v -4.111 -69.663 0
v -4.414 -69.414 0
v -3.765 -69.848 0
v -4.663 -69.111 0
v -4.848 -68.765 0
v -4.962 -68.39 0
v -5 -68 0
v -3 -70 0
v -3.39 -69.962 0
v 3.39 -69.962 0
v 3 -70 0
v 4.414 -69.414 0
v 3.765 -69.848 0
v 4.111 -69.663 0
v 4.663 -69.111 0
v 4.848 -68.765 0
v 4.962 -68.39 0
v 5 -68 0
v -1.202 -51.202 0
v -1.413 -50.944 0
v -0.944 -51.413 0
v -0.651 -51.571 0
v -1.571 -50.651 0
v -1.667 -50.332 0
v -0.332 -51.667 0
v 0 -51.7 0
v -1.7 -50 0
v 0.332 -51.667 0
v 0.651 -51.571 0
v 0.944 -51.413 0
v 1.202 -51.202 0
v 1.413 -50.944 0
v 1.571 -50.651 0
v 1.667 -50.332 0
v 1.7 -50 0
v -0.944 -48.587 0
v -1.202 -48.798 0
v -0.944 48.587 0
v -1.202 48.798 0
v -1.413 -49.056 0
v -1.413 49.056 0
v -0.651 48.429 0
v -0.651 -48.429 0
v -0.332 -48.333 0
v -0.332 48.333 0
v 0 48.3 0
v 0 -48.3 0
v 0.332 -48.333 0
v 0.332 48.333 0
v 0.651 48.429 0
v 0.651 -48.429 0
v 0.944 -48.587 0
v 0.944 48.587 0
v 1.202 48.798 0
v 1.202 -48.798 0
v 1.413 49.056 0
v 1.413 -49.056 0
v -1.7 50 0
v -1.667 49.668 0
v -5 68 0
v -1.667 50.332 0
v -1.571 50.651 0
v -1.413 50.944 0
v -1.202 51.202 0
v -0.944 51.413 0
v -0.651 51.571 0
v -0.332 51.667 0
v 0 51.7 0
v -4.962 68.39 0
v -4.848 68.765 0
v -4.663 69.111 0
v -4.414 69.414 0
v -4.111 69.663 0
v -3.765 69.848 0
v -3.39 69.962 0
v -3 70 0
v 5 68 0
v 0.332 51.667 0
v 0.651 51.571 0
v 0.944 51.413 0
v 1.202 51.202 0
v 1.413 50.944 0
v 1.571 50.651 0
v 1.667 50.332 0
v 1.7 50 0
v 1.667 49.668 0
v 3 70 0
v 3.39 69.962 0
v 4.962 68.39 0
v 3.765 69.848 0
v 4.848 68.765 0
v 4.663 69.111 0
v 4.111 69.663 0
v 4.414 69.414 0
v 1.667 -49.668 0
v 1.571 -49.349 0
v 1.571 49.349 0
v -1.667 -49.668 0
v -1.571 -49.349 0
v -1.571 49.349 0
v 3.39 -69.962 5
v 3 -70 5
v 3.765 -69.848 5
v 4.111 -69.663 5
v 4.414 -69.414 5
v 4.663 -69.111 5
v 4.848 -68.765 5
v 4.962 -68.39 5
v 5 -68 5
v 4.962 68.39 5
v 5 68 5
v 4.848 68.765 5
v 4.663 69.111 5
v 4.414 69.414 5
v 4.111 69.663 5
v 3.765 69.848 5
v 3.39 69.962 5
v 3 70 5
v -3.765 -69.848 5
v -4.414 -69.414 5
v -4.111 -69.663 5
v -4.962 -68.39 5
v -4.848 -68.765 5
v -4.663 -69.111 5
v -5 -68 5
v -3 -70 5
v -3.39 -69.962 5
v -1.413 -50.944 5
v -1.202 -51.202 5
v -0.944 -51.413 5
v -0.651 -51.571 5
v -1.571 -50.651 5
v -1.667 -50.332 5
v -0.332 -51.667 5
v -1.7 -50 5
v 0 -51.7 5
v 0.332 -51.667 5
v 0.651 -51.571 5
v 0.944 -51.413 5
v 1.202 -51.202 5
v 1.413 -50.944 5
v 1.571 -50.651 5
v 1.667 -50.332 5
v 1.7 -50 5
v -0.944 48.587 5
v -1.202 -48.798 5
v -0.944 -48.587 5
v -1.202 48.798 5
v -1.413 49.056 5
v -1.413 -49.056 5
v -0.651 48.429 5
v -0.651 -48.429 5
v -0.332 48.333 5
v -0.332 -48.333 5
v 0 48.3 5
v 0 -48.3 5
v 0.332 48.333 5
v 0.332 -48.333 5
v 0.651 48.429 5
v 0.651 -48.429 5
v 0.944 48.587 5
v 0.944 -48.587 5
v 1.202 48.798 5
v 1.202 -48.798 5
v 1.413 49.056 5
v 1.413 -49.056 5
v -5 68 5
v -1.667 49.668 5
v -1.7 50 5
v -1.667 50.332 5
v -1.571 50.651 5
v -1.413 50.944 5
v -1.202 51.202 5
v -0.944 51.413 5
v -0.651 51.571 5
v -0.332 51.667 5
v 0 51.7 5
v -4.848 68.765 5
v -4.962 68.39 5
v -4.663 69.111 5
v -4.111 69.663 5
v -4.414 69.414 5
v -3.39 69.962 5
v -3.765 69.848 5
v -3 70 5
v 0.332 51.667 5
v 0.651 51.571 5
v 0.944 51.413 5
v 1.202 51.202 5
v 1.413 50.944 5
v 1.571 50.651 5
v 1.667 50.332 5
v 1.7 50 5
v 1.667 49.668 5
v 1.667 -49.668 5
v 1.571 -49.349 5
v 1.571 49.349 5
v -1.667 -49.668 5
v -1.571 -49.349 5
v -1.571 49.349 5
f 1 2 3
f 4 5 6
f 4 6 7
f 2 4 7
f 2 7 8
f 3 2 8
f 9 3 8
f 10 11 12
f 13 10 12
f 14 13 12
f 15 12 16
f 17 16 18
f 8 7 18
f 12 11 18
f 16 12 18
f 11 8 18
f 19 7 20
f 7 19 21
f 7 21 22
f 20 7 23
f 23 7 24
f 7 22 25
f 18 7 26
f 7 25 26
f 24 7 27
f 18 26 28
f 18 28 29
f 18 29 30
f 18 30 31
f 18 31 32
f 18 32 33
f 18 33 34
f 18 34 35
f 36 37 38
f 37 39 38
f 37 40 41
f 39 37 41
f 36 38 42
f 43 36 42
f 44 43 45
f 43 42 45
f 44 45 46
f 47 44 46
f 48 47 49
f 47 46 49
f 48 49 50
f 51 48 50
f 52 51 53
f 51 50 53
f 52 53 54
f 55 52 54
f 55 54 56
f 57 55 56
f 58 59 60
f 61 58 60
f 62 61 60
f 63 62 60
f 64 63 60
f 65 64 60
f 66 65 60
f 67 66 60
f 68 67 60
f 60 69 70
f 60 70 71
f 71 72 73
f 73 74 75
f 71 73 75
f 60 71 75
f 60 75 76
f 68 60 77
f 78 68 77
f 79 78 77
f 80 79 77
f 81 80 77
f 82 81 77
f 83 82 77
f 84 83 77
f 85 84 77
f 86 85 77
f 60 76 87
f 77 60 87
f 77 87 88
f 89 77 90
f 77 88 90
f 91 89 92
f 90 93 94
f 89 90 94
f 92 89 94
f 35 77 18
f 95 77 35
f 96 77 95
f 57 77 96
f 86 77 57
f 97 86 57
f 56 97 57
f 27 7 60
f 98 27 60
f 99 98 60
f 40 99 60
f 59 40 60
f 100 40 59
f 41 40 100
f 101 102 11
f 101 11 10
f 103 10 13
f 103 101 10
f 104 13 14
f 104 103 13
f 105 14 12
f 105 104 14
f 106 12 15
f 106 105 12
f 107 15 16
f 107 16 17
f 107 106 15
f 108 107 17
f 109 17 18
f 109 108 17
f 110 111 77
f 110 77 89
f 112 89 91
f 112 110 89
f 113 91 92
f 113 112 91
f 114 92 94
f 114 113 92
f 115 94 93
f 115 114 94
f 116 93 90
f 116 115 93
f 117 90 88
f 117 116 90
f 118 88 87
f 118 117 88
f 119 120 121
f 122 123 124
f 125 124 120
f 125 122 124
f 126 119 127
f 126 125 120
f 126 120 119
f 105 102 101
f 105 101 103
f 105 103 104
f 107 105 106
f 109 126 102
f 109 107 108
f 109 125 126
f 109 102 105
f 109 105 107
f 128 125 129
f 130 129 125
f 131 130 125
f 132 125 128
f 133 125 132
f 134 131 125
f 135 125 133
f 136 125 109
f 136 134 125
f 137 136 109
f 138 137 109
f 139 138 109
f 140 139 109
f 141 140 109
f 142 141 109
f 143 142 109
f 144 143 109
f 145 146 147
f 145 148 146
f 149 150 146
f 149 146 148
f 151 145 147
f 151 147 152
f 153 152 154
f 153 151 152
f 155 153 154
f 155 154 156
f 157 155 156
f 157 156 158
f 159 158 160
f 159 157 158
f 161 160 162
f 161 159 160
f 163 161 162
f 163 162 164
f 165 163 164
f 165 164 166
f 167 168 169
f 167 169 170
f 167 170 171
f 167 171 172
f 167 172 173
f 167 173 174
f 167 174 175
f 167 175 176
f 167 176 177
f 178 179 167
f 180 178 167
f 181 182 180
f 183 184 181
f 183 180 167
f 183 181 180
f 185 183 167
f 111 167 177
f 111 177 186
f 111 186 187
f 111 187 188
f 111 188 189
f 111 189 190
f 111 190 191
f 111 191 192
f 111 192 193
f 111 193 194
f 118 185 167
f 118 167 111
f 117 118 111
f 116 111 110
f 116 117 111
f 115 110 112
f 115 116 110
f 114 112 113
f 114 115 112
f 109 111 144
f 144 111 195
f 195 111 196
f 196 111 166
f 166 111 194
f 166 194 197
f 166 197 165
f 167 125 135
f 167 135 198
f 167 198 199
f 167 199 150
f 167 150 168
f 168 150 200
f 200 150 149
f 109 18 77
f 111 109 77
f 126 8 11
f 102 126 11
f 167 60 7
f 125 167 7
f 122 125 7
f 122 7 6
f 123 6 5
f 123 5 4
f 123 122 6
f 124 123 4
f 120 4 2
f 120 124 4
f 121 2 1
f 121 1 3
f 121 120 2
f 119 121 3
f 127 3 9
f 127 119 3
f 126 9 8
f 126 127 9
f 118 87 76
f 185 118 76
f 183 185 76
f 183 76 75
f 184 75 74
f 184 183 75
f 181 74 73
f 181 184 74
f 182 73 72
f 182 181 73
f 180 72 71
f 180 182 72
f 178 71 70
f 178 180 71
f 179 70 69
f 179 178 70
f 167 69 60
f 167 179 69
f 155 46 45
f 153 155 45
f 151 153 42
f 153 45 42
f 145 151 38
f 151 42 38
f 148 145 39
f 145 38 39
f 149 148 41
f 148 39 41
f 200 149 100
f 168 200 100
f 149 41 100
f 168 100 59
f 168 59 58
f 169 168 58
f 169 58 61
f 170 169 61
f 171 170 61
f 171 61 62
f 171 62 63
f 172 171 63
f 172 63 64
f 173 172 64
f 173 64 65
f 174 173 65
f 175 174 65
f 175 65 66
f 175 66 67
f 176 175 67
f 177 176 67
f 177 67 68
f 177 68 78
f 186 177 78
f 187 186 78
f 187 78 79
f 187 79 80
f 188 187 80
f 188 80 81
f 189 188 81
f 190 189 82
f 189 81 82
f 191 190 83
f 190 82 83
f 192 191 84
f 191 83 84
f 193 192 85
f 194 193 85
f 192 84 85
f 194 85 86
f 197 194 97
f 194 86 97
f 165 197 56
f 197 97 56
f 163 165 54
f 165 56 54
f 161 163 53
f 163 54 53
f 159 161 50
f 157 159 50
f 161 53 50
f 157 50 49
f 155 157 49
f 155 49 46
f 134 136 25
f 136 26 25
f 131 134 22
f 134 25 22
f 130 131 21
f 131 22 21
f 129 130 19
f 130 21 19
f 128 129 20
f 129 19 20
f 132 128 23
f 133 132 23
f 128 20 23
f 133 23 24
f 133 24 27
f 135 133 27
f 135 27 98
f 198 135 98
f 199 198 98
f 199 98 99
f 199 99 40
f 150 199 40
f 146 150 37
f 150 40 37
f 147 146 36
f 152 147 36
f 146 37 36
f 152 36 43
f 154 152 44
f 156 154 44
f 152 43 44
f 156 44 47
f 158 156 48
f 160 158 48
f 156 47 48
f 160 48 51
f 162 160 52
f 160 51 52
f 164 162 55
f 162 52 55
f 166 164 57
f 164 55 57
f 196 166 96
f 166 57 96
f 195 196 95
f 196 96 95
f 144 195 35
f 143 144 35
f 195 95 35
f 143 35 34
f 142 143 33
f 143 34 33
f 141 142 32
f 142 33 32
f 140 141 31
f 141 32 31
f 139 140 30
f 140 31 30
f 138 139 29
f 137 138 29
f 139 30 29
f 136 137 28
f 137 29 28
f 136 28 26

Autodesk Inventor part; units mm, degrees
ref_plane "YZ Plane" through (0, 0, 0) normal (1, 0, 0) x (0, 1, 0)
ref_plane "XZ Plane" through (0, 0, 0) normal (0, 1, 0) x (-1, 0, 0)
ref_plane "XY Plane" through (0, 0, 0) normal (0, 0, 1) x (1, 0, 0)
sketch "Sketch1" plane through (0, 0, 0) normal (0, 0, 1) x (1, 0, 0)
  line L0 (-5, -70) -> (5, -70)
  line L1 (5, -70) -> (5, 70)
  line L2 (5, 70) -> (-5, 70)
  line L3 (-5, 70) -> (-5, -70)
  line L4 (-5, -70) -> (5, 70) construction
  line L5 (5, -70) -> (-5, 70) construction
  point P0 (0, 0)
  dimension "d0" = 10
  dimension "d1" = 140
extrude "Extrusion1" add sketch "Sketch1" along normal blind 5
sketch "Sketch2" plane through (0, 0, 5) normal (0, 0, 1) x (1, 0, 0)
  line L0 (0, 50) -> (0, -50) construction
  point P0 (0, 0)
  point P1 (0, 0)
  dimension "d4" = 100
hole "Hole1" at (0, 50, 5) at (0, -50, 5) direction (0, 0, -1) diameter 3.4 depth 8 tip angle 118 clearance for "Countersunk Flat Head Screw DIN EN ISO 2009" size "M3" standard "DIN"
fillet "Fillet1" radius 2 4 edges at (5, 70, 2.5) (-5, 70, 2.5) (5, -70, 2.5) (-5, -70, 2.5)
properties part number "ToslinkHalter" material "Polycarbonate, Clear"
